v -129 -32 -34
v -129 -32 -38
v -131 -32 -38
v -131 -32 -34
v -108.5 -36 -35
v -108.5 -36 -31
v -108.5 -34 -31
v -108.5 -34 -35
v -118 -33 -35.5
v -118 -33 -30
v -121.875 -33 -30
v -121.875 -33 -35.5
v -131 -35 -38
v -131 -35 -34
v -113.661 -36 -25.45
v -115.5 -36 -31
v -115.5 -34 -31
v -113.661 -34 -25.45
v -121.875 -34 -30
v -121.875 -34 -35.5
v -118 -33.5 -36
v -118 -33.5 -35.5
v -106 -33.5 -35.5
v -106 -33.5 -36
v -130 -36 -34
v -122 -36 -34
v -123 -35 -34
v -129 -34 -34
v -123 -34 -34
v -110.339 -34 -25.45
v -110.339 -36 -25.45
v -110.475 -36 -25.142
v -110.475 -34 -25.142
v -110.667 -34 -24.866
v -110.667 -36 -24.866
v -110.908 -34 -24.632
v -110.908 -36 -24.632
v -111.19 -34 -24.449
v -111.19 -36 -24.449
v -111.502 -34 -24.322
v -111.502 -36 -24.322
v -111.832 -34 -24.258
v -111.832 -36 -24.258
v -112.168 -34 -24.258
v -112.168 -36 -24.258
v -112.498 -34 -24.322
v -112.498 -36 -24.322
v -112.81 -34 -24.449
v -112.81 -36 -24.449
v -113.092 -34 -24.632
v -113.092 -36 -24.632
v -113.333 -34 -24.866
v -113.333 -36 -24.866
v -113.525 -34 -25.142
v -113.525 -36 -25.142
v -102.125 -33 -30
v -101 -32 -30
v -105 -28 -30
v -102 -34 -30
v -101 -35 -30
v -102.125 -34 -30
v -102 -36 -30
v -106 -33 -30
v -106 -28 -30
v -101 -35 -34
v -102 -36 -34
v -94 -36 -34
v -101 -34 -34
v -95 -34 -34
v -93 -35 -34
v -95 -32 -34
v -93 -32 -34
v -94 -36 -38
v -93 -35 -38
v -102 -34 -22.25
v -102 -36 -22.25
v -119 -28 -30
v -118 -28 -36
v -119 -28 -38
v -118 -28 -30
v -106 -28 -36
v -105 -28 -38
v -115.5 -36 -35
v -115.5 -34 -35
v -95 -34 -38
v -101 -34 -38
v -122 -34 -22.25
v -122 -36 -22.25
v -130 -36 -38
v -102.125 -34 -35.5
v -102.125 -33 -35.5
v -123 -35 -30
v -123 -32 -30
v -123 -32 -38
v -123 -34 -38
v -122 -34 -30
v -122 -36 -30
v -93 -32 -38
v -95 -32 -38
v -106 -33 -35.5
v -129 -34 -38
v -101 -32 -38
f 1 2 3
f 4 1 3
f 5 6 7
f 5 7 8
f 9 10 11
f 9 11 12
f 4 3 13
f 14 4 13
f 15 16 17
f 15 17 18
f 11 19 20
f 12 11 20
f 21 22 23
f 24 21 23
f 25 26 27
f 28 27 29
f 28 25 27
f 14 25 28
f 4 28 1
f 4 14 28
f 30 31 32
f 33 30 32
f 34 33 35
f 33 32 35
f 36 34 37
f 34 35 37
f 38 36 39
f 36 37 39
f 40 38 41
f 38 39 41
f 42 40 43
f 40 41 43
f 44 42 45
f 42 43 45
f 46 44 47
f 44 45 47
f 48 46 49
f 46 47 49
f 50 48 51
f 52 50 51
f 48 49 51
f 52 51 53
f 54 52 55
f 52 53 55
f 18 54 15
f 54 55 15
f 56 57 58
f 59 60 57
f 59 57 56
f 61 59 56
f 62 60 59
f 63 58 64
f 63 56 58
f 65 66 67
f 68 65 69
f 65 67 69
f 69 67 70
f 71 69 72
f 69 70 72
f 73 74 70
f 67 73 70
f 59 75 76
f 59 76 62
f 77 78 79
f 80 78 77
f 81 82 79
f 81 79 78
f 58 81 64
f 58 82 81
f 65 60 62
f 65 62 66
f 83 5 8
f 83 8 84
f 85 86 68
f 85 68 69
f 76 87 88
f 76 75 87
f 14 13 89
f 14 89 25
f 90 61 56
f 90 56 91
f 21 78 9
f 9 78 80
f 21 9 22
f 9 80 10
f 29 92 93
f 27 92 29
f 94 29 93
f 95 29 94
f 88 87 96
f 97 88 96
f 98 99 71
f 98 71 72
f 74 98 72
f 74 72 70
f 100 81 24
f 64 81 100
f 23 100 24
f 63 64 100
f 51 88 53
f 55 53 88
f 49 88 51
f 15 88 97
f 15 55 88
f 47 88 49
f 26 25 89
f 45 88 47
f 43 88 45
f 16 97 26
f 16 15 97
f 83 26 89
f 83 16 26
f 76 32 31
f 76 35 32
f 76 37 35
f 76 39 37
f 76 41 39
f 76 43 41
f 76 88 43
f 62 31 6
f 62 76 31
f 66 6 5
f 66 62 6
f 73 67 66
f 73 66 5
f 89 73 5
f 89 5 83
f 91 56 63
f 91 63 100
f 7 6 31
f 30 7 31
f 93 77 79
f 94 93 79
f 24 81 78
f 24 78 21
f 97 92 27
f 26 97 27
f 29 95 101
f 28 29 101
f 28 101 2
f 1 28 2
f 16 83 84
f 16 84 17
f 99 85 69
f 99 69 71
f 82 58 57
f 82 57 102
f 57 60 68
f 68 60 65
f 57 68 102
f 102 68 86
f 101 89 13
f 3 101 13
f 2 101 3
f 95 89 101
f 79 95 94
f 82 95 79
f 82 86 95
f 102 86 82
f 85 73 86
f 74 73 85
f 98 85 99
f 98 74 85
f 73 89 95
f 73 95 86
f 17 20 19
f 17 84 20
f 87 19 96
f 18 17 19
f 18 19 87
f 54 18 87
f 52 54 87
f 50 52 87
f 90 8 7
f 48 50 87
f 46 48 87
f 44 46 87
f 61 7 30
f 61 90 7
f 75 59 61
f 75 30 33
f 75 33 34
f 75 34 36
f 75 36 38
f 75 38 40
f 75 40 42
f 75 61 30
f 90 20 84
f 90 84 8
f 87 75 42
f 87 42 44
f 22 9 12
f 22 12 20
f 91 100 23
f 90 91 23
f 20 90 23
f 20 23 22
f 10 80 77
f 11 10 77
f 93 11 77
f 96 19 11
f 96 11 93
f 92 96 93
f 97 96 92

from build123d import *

# Parameters (mm, degrees)
PAD012_DEPTH        = 10
SKETCH042_W         = 8
SKETCH042_H         = 1.125
PAD013_DEPTH        = 8
SKETCH043_W         = 6
SKETCH043_H         = 12
POCKET028_DEPTH     = 6
POCKET029_DEPTH     = 5
CHAMFER027_SIZE     = 1
CHAMFER028_SIZE     = 4
PAD014_DEPTH        = 4
CHAMFER029_SIZE     = 1
CLONE009_ROLL_ANGLE = -90


with BuildPart() as part:
    # Sketch041 → Pad012 (new body, symmetric)
    with BuildSketch(Plane.YZ):
        Polygon((-3.25, -21), (-3.25, -23), (12.5, -23), (12.5, -15), (4.5, -15), (4.5, -20), (10, -20), (10, -21), align=None)
    extrude(amount=PAD012_DEPTH, both=True)

    # Sketch042 → Pad013 (new body)
    with BuildSketch(Plane.YX.offset(23)):
        with Locations((8.5, 10.4375)):
            Rectangle(SKETCH042_W, SKETCH042_H)
    pad013 = extrude(amount=-PAD013_DEPTH)

    # Mirrored003: Pad013 across Sketch042 H_Axis
    add(pad013.mirror(Plane(origin=(0, 0, -23), x_dir=(0, 0, -1), z_dir=(1, 0, 0))))

    # Sketch043 → Pocket028 (cut)
    with BuildSketch(Plane(origin=(0, 4.5, 0), x_dir=(0, 0, -1), z_dir=(0, -1, 0))):
        with Locations((17.5, 0)):
            Rectangle(SKETCH043_W, SKETCH043_H)
    extrude(amount=-POCKET028_DEPTH, mode=Mode.SUBTRACT)

    # Sketch044 → Pocket029 (cut)
    with BuildSketch(Plane.YX.offset(23)):
        with BuildLine():
            Line((5.5, 3.5), (9.5, 3.5))
            Line((9.5, 3.5), (9.5, -3.5))
            Line((9.5, -3.5), (5.5, -3.5))
            Line((5.5, -3.5), (-0.050331, -1.661215))
            ThreePointArc((-0.050345, 1.661211), (-1.25, -7e-06), (-0.050331, -1.661215))
            Line((5.5, 3.5), (-0.050345, 1.661211))
        make_face()
    extrude(amount=-POCKET029_DEPTH, mode=Mode.SUBTRACT)

    # Chamfer027
    chamfer027_edges = [part.edges().sort_by_distance(p)[0] for p in [
        (11, 8.5, -23),
        (-11, 8.5, -23),
    ]]
    chamfer(chamfer027_edges, length=CHAMFER027_SIZE)

    # Chamfer028
    chamfer028_edges = [part.edges().sort_by_distance(p)[0] for p in [
        (-11, 8.5, -15),
        (11, 8.5, -15),
    ]]
    chamfer(chamfer028_edges, length=CHAMFER028_SIZE)

    # Sketch045 → Pad014 (new body)
    with BuildSketch(Plane.ZX.offset(12.5)):
        Polygon((-23, 9), (-21, 9), (-21, 17), (-19, 17), (-19, 19), (-23, 19), align=None)
    pad014 = extrude(amount=-PAD014_DEPTH)

    # Mirrored004: Pad014 across Sketch045 H_Axis
    add(pad014.mirror(Plane(origin=(0, 12.5, 0), x_dir=(0, 1, 0), z_dir=(1, 0, 0))))

    # Chamfer029
    chamfer029_edges = [part.edges().sort_by_distance(p)[0] for p in [
        (-19, 10.5, -23),
        (19, 10.5, -23),
    ]]
    chamfer(chamfer029_edges, length=CHAMFER029_SIZE)


with BuildPart() as part_1:
    # Clone009 roll: moved
    add(part.part.rotate(Axis((0, 0, 0), (1, 0, 0)), CLONE009_ROLL_ANGLE))


with BuildPart() as part_2:
    # Clone009 placement: moved
    add(part_1.part.moved(Location((-112, -13, -25.5))))


solid = part_2.part
